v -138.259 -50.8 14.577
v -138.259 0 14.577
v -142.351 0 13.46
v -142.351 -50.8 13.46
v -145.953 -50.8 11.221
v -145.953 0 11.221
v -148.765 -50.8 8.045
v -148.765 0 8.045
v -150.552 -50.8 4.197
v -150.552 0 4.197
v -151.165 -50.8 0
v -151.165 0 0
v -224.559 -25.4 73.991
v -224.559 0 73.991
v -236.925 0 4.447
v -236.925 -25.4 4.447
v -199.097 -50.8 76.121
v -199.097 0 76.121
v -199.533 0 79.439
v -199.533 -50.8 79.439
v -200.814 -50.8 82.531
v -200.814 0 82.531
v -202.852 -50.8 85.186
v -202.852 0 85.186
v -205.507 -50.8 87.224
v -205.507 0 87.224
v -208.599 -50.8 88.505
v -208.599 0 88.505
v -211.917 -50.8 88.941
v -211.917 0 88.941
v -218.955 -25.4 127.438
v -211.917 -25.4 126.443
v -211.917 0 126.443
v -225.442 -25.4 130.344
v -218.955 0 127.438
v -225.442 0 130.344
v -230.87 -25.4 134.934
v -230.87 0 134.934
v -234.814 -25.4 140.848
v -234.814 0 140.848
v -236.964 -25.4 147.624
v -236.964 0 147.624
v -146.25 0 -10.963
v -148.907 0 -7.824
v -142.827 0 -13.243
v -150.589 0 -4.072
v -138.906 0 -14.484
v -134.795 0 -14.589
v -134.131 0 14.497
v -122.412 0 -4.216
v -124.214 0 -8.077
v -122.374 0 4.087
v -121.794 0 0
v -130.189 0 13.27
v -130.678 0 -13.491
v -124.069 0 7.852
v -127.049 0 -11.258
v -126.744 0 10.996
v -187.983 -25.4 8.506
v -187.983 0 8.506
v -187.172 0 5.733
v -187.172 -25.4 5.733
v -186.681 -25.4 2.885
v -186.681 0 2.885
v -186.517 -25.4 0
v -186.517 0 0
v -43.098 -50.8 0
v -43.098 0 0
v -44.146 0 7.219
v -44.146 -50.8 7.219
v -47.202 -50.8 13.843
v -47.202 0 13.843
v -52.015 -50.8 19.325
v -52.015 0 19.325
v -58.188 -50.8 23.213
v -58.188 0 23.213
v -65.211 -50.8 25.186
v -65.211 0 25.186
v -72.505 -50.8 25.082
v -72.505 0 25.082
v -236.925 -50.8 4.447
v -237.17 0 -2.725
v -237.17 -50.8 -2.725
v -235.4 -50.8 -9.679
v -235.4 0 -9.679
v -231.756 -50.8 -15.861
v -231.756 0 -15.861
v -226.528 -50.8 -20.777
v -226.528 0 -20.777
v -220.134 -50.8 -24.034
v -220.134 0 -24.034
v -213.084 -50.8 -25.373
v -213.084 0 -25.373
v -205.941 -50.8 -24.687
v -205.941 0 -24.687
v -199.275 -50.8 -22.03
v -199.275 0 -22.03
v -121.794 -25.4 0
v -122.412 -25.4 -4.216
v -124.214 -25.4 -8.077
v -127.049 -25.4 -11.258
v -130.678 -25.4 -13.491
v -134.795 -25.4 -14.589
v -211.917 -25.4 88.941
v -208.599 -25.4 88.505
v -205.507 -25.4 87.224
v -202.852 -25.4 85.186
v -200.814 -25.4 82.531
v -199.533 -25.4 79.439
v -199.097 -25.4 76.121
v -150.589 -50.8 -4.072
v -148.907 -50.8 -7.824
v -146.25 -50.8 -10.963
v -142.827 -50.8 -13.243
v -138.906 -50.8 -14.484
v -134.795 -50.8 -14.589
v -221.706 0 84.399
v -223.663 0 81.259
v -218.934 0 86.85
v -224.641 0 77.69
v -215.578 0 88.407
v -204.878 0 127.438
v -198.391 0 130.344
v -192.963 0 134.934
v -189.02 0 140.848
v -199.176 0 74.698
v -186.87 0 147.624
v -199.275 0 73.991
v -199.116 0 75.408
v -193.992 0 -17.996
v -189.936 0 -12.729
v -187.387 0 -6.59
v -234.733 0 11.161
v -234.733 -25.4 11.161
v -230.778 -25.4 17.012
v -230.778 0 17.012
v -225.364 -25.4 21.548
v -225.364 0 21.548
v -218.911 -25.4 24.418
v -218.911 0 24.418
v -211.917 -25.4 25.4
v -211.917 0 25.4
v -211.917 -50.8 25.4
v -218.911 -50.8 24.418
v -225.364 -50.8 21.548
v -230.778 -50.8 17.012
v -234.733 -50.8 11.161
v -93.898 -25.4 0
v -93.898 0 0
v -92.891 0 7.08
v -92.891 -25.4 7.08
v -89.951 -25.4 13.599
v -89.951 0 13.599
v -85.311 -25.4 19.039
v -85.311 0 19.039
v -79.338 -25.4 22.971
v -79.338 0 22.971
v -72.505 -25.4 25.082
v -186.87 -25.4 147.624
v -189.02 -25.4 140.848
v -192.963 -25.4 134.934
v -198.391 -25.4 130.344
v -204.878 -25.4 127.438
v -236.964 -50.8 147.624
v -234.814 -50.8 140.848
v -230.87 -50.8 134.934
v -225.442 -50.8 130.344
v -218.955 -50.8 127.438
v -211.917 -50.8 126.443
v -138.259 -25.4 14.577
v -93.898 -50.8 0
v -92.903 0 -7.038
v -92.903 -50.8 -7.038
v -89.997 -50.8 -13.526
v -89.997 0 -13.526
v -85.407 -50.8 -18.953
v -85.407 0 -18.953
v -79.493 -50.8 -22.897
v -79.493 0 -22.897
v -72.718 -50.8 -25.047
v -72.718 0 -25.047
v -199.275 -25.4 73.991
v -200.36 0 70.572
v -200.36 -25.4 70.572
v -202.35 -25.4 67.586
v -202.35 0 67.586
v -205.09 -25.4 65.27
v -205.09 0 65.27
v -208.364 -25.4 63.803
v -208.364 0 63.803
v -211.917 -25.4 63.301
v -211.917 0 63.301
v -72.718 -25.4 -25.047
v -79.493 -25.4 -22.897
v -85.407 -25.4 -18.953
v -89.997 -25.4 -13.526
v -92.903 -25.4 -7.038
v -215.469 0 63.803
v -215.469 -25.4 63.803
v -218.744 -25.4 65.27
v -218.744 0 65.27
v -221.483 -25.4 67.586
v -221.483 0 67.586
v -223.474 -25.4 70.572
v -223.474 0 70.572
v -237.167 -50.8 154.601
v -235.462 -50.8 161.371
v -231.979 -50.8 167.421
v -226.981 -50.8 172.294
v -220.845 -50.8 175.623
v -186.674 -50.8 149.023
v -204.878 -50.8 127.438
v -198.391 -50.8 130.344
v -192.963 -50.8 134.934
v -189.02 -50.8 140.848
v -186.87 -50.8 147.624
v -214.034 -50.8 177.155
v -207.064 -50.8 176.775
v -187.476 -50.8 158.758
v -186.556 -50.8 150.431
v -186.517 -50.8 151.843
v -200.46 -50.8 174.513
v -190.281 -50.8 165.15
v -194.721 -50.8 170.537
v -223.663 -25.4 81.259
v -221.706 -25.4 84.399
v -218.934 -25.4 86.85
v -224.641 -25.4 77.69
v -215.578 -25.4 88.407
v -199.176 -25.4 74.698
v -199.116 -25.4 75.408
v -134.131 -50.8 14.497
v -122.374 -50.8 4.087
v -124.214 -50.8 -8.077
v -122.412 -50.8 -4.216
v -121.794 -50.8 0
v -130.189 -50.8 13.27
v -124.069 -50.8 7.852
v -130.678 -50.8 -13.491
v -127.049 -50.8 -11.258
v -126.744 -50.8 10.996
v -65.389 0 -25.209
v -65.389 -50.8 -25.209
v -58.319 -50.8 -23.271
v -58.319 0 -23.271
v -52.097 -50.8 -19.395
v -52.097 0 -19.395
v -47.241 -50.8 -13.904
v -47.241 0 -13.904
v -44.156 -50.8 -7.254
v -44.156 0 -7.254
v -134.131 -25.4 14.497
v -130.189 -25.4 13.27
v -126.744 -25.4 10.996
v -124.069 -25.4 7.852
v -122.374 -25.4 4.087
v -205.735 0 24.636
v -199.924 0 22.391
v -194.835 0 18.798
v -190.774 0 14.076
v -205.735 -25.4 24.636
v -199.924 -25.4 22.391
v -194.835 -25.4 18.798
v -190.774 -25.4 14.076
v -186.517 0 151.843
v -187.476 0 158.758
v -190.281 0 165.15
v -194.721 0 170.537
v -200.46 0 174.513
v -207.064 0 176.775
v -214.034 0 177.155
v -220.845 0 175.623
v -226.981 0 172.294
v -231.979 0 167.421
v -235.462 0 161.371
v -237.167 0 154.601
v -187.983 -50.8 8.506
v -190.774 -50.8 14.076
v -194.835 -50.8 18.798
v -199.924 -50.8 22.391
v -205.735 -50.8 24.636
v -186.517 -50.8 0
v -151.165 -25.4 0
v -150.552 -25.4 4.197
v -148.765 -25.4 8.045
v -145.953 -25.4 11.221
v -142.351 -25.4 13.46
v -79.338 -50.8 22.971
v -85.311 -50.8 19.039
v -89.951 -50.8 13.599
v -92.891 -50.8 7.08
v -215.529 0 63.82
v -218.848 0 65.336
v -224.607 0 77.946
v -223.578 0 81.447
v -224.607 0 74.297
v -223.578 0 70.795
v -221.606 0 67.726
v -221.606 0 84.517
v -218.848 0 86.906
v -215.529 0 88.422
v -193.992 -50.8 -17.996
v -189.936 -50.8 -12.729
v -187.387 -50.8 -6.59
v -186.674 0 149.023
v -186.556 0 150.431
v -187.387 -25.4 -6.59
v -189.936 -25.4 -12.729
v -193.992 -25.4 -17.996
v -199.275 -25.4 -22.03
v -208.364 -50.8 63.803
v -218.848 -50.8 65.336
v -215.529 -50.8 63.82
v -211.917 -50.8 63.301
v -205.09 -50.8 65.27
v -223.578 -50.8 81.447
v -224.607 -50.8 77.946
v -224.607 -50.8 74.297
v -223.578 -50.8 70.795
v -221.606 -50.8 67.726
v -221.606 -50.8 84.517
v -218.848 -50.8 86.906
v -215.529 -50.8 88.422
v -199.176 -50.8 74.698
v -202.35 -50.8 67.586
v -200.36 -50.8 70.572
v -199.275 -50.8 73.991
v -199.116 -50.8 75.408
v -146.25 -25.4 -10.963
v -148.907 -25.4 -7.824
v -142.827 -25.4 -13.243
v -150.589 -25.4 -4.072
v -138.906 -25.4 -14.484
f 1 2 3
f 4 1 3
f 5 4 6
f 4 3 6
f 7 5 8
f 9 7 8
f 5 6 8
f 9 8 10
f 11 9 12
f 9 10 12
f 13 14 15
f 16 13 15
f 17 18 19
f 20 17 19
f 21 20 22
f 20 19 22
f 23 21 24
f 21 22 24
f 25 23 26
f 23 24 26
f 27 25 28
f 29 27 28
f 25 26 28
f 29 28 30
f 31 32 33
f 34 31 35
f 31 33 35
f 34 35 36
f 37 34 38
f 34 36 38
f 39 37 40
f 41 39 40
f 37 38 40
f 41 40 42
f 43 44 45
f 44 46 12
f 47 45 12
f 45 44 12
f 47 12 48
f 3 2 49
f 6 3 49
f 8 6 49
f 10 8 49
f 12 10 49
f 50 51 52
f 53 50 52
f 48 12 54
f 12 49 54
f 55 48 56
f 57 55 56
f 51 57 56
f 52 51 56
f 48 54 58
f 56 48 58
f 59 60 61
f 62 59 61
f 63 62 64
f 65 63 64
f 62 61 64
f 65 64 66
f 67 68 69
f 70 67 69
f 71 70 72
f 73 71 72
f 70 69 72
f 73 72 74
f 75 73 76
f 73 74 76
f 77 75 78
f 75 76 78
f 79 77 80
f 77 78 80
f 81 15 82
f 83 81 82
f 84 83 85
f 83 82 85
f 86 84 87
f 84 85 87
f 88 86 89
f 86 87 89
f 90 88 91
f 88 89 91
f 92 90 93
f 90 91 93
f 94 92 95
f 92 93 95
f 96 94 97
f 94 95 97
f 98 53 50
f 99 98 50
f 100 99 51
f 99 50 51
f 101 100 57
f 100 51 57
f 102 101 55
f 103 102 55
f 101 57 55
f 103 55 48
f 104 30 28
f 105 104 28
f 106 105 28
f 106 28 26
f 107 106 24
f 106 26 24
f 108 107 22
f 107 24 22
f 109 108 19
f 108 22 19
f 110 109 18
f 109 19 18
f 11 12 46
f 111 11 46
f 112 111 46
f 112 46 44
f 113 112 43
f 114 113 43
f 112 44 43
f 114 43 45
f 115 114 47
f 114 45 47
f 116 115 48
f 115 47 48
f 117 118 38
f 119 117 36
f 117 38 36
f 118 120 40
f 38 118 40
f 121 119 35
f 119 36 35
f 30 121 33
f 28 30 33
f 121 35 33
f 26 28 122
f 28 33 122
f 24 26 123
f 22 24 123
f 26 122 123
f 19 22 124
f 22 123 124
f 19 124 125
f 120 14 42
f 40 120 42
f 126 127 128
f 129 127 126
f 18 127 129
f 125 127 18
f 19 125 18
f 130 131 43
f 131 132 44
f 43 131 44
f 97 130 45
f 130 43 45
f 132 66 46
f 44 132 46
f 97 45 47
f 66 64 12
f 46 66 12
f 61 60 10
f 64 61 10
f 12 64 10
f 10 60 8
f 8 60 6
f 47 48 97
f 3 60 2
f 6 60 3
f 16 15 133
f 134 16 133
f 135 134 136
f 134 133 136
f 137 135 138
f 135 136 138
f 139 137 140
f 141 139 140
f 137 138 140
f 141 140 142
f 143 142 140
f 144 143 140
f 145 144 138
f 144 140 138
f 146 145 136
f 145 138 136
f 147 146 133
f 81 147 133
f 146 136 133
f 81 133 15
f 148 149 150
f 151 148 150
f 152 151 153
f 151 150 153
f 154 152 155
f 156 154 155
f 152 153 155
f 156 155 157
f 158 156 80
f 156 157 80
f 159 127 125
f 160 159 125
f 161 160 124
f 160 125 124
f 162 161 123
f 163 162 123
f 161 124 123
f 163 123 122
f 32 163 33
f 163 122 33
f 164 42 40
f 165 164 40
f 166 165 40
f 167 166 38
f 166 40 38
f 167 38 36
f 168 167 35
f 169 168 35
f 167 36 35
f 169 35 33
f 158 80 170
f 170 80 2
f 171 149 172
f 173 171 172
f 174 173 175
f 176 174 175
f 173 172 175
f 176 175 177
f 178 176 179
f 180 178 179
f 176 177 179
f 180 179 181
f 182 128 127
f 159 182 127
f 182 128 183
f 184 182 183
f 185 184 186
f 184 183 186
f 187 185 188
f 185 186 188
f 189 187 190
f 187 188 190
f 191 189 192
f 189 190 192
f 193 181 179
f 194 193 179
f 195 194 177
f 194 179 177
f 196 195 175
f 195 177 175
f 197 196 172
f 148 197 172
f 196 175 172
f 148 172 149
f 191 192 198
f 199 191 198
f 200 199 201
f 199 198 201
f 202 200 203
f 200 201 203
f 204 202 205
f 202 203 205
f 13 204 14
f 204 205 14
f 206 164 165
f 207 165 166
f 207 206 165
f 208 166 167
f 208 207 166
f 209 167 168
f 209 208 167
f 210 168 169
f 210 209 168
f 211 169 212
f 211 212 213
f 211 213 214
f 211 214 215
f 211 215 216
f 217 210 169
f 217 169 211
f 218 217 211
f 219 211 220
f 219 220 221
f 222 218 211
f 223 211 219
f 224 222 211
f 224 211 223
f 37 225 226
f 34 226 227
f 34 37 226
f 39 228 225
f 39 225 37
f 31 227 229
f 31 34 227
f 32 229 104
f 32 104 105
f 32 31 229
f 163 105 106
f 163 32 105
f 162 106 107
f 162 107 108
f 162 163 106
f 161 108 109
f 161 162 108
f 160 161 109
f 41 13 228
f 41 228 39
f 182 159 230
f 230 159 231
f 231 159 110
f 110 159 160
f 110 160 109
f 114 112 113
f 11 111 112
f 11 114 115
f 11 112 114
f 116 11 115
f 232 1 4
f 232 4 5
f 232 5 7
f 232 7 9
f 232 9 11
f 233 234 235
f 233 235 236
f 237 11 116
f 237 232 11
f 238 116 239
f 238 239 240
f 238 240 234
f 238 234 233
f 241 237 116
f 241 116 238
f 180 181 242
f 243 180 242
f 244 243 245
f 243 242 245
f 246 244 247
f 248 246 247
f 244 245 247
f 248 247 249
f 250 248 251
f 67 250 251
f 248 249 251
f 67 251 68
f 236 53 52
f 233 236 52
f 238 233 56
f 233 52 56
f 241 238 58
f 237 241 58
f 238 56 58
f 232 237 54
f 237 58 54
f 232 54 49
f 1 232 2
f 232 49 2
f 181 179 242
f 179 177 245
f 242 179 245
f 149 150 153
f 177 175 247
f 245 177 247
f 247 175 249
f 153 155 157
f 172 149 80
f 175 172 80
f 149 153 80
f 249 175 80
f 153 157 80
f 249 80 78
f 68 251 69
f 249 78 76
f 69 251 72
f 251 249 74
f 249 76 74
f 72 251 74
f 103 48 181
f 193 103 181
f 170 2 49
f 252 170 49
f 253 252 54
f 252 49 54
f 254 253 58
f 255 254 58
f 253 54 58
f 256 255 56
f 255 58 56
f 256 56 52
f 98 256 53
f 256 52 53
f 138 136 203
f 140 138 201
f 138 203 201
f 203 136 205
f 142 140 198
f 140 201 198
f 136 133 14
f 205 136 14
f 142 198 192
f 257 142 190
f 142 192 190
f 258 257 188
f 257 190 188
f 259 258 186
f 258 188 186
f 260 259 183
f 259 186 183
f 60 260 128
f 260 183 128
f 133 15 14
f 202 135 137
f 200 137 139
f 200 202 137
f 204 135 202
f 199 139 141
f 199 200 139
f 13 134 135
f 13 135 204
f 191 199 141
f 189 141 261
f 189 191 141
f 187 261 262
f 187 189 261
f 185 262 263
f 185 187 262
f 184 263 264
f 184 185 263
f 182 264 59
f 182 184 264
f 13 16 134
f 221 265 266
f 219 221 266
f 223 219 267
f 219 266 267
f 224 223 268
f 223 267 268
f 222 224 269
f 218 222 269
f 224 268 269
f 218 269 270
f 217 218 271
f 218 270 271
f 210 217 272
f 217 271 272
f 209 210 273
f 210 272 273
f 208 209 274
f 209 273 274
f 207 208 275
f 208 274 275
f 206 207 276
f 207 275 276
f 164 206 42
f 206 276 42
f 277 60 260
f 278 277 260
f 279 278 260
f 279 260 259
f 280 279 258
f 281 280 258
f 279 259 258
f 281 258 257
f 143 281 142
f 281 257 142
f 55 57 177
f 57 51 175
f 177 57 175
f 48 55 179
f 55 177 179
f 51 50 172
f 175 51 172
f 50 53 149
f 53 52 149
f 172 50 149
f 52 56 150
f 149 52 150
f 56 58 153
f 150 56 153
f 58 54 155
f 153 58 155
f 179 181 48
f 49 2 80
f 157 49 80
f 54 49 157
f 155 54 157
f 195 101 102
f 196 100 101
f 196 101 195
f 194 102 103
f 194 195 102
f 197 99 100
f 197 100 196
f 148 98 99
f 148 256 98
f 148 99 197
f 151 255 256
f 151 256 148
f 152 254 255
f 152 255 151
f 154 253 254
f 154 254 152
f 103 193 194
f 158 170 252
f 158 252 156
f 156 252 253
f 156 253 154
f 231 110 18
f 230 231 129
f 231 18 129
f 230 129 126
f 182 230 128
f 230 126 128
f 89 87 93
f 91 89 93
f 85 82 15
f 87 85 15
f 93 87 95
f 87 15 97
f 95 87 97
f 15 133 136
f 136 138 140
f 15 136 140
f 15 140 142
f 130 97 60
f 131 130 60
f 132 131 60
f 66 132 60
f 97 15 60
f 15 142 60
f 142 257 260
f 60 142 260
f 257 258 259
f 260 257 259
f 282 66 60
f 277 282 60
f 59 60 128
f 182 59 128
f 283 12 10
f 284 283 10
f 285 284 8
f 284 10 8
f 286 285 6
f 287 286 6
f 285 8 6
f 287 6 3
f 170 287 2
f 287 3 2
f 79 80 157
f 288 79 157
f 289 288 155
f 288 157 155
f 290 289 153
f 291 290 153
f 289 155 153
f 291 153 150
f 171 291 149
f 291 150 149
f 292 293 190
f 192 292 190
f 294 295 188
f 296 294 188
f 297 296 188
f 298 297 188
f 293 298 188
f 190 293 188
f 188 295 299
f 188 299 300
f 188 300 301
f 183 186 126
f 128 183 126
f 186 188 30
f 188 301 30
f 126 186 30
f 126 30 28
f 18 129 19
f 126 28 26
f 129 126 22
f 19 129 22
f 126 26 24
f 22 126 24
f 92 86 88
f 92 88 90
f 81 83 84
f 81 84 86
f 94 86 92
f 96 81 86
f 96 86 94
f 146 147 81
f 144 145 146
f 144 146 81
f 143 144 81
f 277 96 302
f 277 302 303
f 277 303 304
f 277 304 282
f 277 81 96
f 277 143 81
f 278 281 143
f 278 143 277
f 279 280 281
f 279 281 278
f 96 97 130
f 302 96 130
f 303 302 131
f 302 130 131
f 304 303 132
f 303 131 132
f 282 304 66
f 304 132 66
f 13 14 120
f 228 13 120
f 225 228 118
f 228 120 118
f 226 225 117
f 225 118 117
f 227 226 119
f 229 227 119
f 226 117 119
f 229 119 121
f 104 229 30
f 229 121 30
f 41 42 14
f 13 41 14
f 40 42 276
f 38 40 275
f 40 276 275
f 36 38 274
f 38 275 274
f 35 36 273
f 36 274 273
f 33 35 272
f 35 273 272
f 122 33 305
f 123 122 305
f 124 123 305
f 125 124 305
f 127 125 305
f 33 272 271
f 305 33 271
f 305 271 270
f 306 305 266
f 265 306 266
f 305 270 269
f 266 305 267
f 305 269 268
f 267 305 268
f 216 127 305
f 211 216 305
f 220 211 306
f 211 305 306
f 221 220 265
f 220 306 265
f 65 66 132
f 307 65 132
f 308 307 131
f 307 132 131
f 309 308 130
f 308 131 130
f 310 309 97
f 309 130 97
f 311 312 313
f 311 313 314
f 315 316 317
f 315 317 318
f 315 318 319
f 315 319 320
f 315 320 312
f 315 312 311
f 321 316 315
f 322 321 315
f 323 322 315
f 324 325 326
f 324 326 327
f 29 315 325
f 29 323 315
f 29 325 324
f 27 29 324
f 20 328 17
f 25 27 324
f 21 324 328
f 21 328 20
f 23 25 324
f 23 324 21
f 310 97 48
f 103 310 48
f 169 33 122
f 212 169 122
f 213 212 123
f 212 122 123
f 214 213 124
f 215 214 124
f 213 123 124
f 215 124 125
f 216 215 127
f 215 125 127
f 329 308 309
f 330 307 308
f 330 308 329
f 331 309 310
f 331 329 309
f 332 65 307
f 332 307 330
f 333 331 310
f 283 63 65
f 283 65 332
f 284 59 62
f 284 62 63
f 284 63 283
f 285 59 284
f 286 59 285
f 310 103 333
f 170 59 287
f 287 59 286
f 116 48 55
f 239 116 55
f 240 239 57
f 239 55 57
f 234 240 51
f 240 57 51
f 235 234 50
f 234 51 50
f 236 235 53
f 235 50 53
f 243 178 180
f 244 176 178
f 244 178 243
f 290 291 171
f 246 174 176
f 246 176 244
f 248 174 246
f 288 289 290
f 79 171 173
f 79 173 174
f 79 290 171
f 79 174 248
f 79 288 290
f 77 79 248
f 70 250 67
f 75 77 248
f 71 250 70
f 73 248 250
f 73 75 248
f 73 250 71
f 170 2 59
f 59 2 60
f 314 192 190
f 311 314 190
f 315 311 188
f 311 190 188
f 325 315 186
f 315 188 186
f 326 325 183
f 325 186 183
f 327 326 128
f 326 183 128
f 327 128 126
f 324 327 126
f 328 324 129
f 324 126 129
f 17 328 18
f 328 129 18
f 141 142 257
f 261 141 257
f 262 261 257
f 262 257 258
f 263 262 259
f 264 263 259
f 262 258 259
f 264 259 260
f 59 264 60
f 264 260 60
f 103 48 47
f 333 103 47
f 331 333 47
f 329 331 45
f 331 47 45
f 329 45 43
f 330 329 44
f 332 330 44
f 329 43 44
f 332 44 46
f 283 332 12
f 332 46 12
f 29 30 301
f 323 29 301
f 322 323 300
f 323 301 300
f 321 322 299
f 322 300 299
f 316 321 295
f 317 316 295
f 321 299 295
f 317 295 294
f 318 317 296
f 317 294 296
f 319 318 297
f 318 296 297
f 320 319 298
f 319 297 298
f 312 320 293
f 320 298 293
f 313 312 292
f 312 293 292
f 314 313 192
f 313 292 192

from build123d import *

# Parameters (mm, degrees)
F1_DEPTH = 50.8
F2_DEPTH = 25.4


with BuildPart() as f1:
    # F0 (on Front) → F1 (new body)
    with BuildSketch(Plane.XZ):
        with BuildLine():
            ThreePointArc((-211.9167751071, 126.4433380044), (-195.5158742035, 132.4482239405), (-186.8697401642, 147.6236175673))
            ThreePointArc((-186.8697401642, 147.6236175673), (-186.6051701842, 149.7261095744), (-186.5167751071, 151.8433380044))
            ThreePointArc((-186.5167751071, 151.8433380044), (-214.0340035371, 177.1549429273), (-236.9638100501, 147.6236175673))
            ThreePointArc((-236.9638100501, 147.6236175673), (-228.3176760107, 132.4482239405), (-211.9167751071, 126.4433380044))
        make_face()
    extrude(amount=F1_DEPTH)


with BuildPart() as f1b:
    # F0 (on Front) → F1, piece 2 (new body)
    with BuildSketch(Plane.XZ):
        with BuildLine():
            Line((-211.9167751071, 76.1211671092), (-211.9167751071, 63.3009463244))
            ThreePointArc((-211.9167751071, 63.3009463244), (-203.6386975224, 66.3318110287), (-199.2747074704, 73.9913345244))
            ThreePointArc((-199.2747074704, 73.9913345244), (-199.1411702438, 75.0525318366), (-199.0965543223, 76.1211671092))
            ThreePointArc((-199.0965543223, 76.1211671092), (-202.8515100539, 85.1864321624), (-211.9167751071, 88.9413878939))
            Line((-211.9167751071, 88.9413878939), (-211.9167751071, 76.1211671092))
        make_face()
        with BuildLine():
            ThreePointArc((-224.5588427438, 73.9913345244), (-220.1948526919, 66.3318110287), (-211.9167751071, 63.3009463244))
            Line((-211.9167751071, 63.3009463244), (-211.9167751071, 76.1211671092))
            Line((-211.9167751071, 76.1211671092), (-211.9167751071, 88.9413878939))
            ThreePointArc((-211.9167751071, 88.9413878939), (-221.7061311876, 84.3992446939), (-224.5588427438, 73.9913345244))
        make_face()
    extrude(amount=F1_DEPTH)


with BuildPart() as f1c:
    # F0 (on Front) → F1, piece 3 (new body)
    with BuildSketch(Plane.XZ):
        with BuildLine():
            Line((-186.5167751071, 0), (-211.9167751071, 0))
            Line((-211.9167751071, 0), (-211.9167751071, 25.4))
            ThreePointArc((-211.9167751071, 25.4), (-228.2295951235, 19.4692553302), (-236.9245277098, 4.4466065444))
            ThreePointArc((-236.9245277098, 4.4466065444), (-226.5279143641, -20.7767805401), (-199.2747074704, -22.0303909604))
            ThreePointArc((-199.2747074704, -22.0303909604), (-189.9364598458, -12.7289332237), (-186.5167751071, 0))
        make_face()
        with BuildLine():
            Line((-211.9167751071, 25.4), (-211.9167751071, 0))
            Line((-211.9167751071, 0), (-186.5167751071, 0))
            Line((-186.5167751071, 0), (-187.983467712, 8.5062798644))
            ThreePointArc((-187.983467712, 8.5062798644), (-197.269241331, 20.7511386261), (-211.9167751071, 25.4))
        make_face()
    extrude(amount=F1_DEPTH)


with BuildPart() as f1d:
    # F0 (on Front) → F1, piece 4 (new body)
    with BuildSketch(Plane.XZ):
        with BuildLine():
            ThreePointArc((-121.7935765503, 0), (-126.7444418401, 10.9955136808), (-138.2589179551, 14.5773048554))
            ThreePointArc((-138.2589179551, 14.5773048554), (-147.4746431309, 9.73468761), (-151.1646823497, 0))
            Line((-151.1646823497, 0), (-121.7935765503, 0))
        make_face()
        with BuildLine():
            ThreePointArc((-151.1646823497, 0), (-146.2499849741, -10.9633866254), (-134.7954183365, -14.5887141604))
            ThreePointArc((-134.7954183365, -14.5887141604), (-125.5157428246, -9.770855524), (-121.7935765503, 0))
            Line((-121.7935765503, 0), (-151.1646823497, 0))
        make_face()
    extrude(amount=F1_DEPTH)


with BuildPart() as f1e:
    # F0 (on Front) → F1, piece 5 (new body)
    with BuildSketch(Plane.XZ):
        with BuildLine():
            ThreePointArc((-43.0981432392, 0), (-52.0150964231, 19.325350389), (-72.5051643145, 25.0819413543))
            ThreePointArc((-72.5051643145, 25.0819413543), (-87.8234936282, 16.4830468162), (-93.8981432392, 0))
            ThreePointArc((-93.8981432392, 0), (-87.8932573547, -16.4009008425), (-72.717863834, -25.0470349164))
            ThreePointArc((-72.717863834, -25.0470349164), (-52.0972423967, -19.3951141155), (-43.0981432392, 0))
        make_face()
    extrude(amount=F1_DEPTH)


with BuildPart() as f2:
    # F0 (on Front) → F2 (new body)
    with BuildSketch(Plane.XZ):
        with BuildLine():
            Line((-236.9638100501, 147.6236175673), (-224.5588427438, 73.9913345244))
            ThreePointArc((-224.5588427438, 73.9913345244), (-221.7061311876, 84.3992446939), (-211.9167751071, 88.9413878939))
            Line((-211.9167751071, 88.9413878939), (-211.9167751071, 126.4433380044))
            ThreePointArc((-211.9167751071, 126.4433380044), (-228.3176760107, 132.4482239405), (-236.9638100501, 147.6236175673))
        make_face()
        with BuildLine():
            ThreePointArc((-199.0965543223, 76.1211671092), (-199.1411702438, 75.0525318366), (-199.2747074704, 73.9913345244))
            Line((-199.2747074704, 73.9913345244), (-186.8697401642, 147.6236175673))
            ThreePointArc((-186.8697401642, 147.6236175673), (-195.5158742035, 132.4482239405), (-211.9167751071, 126.4433380044))
            Line((-211.9167751071, 126.4433380044), (-211.9167751071, 88.9413878939))
            ThreePointArc((-211.9167751071, 88.9413878939), (-202.8515100539, 85.1864321624), (-199.0965543223, 76.1211671092))
        make_face()
    extrude(amount=F2_DEPTH)


with BuildPart() as f2b:
    # F0 (on Front) → F2, piece 2 (new body)
    with BuildSketch(Plane.XZ):
        with BuildLine():
            Line((-211.9167751071, 63.3009463244), (-211.9167751071, 25.4))
            ThreePointArc((-211.9167751071, 25.4), (-197.269241331, 20.7511386261), (-187.983467712, 8.5062798644))
            Line((-187.983467712, 8.5062798644), (-199.2747074704, 73.9913345244))
            ThreePointArc((-199.2747074704, 73.9913345244), (-203.6386975224, 66.3318110287), (-211.9167751071, 63.3009463244))
        make_face()
        with BuildLine():
            ThreePointArc((-236.9245277098, 4.4466065444), (-228.2295951235, 19.4692553302), (-211.9167751071, 25.4))
            Line((-211.9167751071, 25.4), (-211.9167751071, 63.3009463244))
            ThreePointArc((-211.9167751071, 63.3009463244), (-220.1948526919, 66.3318110287), (-224.5588427438, 73.9913345244))
            Line((-224.5588427438, 73.9913345244), (-236.9245277098, 4.4466065444))
        make_face()
    extrude(amount=F2_DEPTH)


with BuildPart() as f2c:
    # F0 (on Front) → F2, piece 3 (new body)
    with BuildSketch(Plane.XZ):
        with BuildLine():
            ThreePointArc((-121.7935765503, 0), (-125.5157428246, -9.770855524), (-134.7954183365, -14.5887141604))
            Line((-134.7954183365, -14.5887141604), (-72.717863834, -25.0470349164))
            ThreePointArc((-72.717863834, -25.0470349164), (-87.8932573547, -16.4009008425), (-93.8981432392, 0))
            Line((-93.8981432392, 0), (-119.2981432392, 0))
            Line((-119.2981432392, 0), (-121.7935765503, 0))
        make_face()
        with BuildLine():
            Line((-72.5051643145, 25.0819413543), (-138.2589179551, 14.5773048554))
            ThreePointArc((-138.2589179551, 14.5773048554), (-126.7444418401, 10.9955136808), (-121.7935765503, 0))
            Line((-121.7935765503, 0), (-119.2981432392, 0))
            Line((-119.2981432392, 0), (-93.8981432392, 0))
            ThreePointArc((-93.8981432392, 0), (-87.8234936282, 16.4830468162), (-72.5051643145, 25.0819413543))
        make_face()
    extrude(amount=F2_DEPTH)


with BuildPart() as f2d:
    # F0 (on Front) → F2, piece 4 (new body)
    with BuildSketch(Plane.XZ):
        with BuildLine():
            ThreePointArc((-187.983467712, 8.5062798644), (-186.8861338065, 4.3159003791), (-186.5167751071, 0))
            Line((-186.5167751071, 0), (-182.8762030692, 0))
            Line((-182.8762030692, 0), (-165.6074591732, 0))
            Line((-165.6074591732, 0), (-151.1646823497, 0))
            ThreePointArc((-151.1646823497, 0), (-147.4746431309, 9.73468761), (-138.2589179551, 14.5773048554))
            Line((-138.2589179551, 14.5773048554), (-187.983467712, 8.5062798644))
        make_face()
        with BuildLine():
            Line((-182.8762030692, 0), (-186.5167751071, 0))
            ThreePointArc((-186.5167751071, 0), (-189.9364598458, -12.7289332237), (-199.2747074704, -22.0303909604))
            Line((-199.2747074704, -22.0303909604), (-134.7954183365, -14.5887141604))
            ThreePointArc((-134.7954183365, -14.5887141604), (-146.2499849741, -10.9633866254), (-151.1646823497, 0))
            Line((-151.1646823497, 0), (-165.6074591732, 0))
            Line((-165.6074591732, 0), (-182.8762030692, 0))
        make_face()
    extrude(amount=F2_DEPTH)


solid = Compound([f1.part, f1b.part, f1c.part, f1d.part, f1e.part, f2.part, f2b.part, f2c.part, f2d.part])
